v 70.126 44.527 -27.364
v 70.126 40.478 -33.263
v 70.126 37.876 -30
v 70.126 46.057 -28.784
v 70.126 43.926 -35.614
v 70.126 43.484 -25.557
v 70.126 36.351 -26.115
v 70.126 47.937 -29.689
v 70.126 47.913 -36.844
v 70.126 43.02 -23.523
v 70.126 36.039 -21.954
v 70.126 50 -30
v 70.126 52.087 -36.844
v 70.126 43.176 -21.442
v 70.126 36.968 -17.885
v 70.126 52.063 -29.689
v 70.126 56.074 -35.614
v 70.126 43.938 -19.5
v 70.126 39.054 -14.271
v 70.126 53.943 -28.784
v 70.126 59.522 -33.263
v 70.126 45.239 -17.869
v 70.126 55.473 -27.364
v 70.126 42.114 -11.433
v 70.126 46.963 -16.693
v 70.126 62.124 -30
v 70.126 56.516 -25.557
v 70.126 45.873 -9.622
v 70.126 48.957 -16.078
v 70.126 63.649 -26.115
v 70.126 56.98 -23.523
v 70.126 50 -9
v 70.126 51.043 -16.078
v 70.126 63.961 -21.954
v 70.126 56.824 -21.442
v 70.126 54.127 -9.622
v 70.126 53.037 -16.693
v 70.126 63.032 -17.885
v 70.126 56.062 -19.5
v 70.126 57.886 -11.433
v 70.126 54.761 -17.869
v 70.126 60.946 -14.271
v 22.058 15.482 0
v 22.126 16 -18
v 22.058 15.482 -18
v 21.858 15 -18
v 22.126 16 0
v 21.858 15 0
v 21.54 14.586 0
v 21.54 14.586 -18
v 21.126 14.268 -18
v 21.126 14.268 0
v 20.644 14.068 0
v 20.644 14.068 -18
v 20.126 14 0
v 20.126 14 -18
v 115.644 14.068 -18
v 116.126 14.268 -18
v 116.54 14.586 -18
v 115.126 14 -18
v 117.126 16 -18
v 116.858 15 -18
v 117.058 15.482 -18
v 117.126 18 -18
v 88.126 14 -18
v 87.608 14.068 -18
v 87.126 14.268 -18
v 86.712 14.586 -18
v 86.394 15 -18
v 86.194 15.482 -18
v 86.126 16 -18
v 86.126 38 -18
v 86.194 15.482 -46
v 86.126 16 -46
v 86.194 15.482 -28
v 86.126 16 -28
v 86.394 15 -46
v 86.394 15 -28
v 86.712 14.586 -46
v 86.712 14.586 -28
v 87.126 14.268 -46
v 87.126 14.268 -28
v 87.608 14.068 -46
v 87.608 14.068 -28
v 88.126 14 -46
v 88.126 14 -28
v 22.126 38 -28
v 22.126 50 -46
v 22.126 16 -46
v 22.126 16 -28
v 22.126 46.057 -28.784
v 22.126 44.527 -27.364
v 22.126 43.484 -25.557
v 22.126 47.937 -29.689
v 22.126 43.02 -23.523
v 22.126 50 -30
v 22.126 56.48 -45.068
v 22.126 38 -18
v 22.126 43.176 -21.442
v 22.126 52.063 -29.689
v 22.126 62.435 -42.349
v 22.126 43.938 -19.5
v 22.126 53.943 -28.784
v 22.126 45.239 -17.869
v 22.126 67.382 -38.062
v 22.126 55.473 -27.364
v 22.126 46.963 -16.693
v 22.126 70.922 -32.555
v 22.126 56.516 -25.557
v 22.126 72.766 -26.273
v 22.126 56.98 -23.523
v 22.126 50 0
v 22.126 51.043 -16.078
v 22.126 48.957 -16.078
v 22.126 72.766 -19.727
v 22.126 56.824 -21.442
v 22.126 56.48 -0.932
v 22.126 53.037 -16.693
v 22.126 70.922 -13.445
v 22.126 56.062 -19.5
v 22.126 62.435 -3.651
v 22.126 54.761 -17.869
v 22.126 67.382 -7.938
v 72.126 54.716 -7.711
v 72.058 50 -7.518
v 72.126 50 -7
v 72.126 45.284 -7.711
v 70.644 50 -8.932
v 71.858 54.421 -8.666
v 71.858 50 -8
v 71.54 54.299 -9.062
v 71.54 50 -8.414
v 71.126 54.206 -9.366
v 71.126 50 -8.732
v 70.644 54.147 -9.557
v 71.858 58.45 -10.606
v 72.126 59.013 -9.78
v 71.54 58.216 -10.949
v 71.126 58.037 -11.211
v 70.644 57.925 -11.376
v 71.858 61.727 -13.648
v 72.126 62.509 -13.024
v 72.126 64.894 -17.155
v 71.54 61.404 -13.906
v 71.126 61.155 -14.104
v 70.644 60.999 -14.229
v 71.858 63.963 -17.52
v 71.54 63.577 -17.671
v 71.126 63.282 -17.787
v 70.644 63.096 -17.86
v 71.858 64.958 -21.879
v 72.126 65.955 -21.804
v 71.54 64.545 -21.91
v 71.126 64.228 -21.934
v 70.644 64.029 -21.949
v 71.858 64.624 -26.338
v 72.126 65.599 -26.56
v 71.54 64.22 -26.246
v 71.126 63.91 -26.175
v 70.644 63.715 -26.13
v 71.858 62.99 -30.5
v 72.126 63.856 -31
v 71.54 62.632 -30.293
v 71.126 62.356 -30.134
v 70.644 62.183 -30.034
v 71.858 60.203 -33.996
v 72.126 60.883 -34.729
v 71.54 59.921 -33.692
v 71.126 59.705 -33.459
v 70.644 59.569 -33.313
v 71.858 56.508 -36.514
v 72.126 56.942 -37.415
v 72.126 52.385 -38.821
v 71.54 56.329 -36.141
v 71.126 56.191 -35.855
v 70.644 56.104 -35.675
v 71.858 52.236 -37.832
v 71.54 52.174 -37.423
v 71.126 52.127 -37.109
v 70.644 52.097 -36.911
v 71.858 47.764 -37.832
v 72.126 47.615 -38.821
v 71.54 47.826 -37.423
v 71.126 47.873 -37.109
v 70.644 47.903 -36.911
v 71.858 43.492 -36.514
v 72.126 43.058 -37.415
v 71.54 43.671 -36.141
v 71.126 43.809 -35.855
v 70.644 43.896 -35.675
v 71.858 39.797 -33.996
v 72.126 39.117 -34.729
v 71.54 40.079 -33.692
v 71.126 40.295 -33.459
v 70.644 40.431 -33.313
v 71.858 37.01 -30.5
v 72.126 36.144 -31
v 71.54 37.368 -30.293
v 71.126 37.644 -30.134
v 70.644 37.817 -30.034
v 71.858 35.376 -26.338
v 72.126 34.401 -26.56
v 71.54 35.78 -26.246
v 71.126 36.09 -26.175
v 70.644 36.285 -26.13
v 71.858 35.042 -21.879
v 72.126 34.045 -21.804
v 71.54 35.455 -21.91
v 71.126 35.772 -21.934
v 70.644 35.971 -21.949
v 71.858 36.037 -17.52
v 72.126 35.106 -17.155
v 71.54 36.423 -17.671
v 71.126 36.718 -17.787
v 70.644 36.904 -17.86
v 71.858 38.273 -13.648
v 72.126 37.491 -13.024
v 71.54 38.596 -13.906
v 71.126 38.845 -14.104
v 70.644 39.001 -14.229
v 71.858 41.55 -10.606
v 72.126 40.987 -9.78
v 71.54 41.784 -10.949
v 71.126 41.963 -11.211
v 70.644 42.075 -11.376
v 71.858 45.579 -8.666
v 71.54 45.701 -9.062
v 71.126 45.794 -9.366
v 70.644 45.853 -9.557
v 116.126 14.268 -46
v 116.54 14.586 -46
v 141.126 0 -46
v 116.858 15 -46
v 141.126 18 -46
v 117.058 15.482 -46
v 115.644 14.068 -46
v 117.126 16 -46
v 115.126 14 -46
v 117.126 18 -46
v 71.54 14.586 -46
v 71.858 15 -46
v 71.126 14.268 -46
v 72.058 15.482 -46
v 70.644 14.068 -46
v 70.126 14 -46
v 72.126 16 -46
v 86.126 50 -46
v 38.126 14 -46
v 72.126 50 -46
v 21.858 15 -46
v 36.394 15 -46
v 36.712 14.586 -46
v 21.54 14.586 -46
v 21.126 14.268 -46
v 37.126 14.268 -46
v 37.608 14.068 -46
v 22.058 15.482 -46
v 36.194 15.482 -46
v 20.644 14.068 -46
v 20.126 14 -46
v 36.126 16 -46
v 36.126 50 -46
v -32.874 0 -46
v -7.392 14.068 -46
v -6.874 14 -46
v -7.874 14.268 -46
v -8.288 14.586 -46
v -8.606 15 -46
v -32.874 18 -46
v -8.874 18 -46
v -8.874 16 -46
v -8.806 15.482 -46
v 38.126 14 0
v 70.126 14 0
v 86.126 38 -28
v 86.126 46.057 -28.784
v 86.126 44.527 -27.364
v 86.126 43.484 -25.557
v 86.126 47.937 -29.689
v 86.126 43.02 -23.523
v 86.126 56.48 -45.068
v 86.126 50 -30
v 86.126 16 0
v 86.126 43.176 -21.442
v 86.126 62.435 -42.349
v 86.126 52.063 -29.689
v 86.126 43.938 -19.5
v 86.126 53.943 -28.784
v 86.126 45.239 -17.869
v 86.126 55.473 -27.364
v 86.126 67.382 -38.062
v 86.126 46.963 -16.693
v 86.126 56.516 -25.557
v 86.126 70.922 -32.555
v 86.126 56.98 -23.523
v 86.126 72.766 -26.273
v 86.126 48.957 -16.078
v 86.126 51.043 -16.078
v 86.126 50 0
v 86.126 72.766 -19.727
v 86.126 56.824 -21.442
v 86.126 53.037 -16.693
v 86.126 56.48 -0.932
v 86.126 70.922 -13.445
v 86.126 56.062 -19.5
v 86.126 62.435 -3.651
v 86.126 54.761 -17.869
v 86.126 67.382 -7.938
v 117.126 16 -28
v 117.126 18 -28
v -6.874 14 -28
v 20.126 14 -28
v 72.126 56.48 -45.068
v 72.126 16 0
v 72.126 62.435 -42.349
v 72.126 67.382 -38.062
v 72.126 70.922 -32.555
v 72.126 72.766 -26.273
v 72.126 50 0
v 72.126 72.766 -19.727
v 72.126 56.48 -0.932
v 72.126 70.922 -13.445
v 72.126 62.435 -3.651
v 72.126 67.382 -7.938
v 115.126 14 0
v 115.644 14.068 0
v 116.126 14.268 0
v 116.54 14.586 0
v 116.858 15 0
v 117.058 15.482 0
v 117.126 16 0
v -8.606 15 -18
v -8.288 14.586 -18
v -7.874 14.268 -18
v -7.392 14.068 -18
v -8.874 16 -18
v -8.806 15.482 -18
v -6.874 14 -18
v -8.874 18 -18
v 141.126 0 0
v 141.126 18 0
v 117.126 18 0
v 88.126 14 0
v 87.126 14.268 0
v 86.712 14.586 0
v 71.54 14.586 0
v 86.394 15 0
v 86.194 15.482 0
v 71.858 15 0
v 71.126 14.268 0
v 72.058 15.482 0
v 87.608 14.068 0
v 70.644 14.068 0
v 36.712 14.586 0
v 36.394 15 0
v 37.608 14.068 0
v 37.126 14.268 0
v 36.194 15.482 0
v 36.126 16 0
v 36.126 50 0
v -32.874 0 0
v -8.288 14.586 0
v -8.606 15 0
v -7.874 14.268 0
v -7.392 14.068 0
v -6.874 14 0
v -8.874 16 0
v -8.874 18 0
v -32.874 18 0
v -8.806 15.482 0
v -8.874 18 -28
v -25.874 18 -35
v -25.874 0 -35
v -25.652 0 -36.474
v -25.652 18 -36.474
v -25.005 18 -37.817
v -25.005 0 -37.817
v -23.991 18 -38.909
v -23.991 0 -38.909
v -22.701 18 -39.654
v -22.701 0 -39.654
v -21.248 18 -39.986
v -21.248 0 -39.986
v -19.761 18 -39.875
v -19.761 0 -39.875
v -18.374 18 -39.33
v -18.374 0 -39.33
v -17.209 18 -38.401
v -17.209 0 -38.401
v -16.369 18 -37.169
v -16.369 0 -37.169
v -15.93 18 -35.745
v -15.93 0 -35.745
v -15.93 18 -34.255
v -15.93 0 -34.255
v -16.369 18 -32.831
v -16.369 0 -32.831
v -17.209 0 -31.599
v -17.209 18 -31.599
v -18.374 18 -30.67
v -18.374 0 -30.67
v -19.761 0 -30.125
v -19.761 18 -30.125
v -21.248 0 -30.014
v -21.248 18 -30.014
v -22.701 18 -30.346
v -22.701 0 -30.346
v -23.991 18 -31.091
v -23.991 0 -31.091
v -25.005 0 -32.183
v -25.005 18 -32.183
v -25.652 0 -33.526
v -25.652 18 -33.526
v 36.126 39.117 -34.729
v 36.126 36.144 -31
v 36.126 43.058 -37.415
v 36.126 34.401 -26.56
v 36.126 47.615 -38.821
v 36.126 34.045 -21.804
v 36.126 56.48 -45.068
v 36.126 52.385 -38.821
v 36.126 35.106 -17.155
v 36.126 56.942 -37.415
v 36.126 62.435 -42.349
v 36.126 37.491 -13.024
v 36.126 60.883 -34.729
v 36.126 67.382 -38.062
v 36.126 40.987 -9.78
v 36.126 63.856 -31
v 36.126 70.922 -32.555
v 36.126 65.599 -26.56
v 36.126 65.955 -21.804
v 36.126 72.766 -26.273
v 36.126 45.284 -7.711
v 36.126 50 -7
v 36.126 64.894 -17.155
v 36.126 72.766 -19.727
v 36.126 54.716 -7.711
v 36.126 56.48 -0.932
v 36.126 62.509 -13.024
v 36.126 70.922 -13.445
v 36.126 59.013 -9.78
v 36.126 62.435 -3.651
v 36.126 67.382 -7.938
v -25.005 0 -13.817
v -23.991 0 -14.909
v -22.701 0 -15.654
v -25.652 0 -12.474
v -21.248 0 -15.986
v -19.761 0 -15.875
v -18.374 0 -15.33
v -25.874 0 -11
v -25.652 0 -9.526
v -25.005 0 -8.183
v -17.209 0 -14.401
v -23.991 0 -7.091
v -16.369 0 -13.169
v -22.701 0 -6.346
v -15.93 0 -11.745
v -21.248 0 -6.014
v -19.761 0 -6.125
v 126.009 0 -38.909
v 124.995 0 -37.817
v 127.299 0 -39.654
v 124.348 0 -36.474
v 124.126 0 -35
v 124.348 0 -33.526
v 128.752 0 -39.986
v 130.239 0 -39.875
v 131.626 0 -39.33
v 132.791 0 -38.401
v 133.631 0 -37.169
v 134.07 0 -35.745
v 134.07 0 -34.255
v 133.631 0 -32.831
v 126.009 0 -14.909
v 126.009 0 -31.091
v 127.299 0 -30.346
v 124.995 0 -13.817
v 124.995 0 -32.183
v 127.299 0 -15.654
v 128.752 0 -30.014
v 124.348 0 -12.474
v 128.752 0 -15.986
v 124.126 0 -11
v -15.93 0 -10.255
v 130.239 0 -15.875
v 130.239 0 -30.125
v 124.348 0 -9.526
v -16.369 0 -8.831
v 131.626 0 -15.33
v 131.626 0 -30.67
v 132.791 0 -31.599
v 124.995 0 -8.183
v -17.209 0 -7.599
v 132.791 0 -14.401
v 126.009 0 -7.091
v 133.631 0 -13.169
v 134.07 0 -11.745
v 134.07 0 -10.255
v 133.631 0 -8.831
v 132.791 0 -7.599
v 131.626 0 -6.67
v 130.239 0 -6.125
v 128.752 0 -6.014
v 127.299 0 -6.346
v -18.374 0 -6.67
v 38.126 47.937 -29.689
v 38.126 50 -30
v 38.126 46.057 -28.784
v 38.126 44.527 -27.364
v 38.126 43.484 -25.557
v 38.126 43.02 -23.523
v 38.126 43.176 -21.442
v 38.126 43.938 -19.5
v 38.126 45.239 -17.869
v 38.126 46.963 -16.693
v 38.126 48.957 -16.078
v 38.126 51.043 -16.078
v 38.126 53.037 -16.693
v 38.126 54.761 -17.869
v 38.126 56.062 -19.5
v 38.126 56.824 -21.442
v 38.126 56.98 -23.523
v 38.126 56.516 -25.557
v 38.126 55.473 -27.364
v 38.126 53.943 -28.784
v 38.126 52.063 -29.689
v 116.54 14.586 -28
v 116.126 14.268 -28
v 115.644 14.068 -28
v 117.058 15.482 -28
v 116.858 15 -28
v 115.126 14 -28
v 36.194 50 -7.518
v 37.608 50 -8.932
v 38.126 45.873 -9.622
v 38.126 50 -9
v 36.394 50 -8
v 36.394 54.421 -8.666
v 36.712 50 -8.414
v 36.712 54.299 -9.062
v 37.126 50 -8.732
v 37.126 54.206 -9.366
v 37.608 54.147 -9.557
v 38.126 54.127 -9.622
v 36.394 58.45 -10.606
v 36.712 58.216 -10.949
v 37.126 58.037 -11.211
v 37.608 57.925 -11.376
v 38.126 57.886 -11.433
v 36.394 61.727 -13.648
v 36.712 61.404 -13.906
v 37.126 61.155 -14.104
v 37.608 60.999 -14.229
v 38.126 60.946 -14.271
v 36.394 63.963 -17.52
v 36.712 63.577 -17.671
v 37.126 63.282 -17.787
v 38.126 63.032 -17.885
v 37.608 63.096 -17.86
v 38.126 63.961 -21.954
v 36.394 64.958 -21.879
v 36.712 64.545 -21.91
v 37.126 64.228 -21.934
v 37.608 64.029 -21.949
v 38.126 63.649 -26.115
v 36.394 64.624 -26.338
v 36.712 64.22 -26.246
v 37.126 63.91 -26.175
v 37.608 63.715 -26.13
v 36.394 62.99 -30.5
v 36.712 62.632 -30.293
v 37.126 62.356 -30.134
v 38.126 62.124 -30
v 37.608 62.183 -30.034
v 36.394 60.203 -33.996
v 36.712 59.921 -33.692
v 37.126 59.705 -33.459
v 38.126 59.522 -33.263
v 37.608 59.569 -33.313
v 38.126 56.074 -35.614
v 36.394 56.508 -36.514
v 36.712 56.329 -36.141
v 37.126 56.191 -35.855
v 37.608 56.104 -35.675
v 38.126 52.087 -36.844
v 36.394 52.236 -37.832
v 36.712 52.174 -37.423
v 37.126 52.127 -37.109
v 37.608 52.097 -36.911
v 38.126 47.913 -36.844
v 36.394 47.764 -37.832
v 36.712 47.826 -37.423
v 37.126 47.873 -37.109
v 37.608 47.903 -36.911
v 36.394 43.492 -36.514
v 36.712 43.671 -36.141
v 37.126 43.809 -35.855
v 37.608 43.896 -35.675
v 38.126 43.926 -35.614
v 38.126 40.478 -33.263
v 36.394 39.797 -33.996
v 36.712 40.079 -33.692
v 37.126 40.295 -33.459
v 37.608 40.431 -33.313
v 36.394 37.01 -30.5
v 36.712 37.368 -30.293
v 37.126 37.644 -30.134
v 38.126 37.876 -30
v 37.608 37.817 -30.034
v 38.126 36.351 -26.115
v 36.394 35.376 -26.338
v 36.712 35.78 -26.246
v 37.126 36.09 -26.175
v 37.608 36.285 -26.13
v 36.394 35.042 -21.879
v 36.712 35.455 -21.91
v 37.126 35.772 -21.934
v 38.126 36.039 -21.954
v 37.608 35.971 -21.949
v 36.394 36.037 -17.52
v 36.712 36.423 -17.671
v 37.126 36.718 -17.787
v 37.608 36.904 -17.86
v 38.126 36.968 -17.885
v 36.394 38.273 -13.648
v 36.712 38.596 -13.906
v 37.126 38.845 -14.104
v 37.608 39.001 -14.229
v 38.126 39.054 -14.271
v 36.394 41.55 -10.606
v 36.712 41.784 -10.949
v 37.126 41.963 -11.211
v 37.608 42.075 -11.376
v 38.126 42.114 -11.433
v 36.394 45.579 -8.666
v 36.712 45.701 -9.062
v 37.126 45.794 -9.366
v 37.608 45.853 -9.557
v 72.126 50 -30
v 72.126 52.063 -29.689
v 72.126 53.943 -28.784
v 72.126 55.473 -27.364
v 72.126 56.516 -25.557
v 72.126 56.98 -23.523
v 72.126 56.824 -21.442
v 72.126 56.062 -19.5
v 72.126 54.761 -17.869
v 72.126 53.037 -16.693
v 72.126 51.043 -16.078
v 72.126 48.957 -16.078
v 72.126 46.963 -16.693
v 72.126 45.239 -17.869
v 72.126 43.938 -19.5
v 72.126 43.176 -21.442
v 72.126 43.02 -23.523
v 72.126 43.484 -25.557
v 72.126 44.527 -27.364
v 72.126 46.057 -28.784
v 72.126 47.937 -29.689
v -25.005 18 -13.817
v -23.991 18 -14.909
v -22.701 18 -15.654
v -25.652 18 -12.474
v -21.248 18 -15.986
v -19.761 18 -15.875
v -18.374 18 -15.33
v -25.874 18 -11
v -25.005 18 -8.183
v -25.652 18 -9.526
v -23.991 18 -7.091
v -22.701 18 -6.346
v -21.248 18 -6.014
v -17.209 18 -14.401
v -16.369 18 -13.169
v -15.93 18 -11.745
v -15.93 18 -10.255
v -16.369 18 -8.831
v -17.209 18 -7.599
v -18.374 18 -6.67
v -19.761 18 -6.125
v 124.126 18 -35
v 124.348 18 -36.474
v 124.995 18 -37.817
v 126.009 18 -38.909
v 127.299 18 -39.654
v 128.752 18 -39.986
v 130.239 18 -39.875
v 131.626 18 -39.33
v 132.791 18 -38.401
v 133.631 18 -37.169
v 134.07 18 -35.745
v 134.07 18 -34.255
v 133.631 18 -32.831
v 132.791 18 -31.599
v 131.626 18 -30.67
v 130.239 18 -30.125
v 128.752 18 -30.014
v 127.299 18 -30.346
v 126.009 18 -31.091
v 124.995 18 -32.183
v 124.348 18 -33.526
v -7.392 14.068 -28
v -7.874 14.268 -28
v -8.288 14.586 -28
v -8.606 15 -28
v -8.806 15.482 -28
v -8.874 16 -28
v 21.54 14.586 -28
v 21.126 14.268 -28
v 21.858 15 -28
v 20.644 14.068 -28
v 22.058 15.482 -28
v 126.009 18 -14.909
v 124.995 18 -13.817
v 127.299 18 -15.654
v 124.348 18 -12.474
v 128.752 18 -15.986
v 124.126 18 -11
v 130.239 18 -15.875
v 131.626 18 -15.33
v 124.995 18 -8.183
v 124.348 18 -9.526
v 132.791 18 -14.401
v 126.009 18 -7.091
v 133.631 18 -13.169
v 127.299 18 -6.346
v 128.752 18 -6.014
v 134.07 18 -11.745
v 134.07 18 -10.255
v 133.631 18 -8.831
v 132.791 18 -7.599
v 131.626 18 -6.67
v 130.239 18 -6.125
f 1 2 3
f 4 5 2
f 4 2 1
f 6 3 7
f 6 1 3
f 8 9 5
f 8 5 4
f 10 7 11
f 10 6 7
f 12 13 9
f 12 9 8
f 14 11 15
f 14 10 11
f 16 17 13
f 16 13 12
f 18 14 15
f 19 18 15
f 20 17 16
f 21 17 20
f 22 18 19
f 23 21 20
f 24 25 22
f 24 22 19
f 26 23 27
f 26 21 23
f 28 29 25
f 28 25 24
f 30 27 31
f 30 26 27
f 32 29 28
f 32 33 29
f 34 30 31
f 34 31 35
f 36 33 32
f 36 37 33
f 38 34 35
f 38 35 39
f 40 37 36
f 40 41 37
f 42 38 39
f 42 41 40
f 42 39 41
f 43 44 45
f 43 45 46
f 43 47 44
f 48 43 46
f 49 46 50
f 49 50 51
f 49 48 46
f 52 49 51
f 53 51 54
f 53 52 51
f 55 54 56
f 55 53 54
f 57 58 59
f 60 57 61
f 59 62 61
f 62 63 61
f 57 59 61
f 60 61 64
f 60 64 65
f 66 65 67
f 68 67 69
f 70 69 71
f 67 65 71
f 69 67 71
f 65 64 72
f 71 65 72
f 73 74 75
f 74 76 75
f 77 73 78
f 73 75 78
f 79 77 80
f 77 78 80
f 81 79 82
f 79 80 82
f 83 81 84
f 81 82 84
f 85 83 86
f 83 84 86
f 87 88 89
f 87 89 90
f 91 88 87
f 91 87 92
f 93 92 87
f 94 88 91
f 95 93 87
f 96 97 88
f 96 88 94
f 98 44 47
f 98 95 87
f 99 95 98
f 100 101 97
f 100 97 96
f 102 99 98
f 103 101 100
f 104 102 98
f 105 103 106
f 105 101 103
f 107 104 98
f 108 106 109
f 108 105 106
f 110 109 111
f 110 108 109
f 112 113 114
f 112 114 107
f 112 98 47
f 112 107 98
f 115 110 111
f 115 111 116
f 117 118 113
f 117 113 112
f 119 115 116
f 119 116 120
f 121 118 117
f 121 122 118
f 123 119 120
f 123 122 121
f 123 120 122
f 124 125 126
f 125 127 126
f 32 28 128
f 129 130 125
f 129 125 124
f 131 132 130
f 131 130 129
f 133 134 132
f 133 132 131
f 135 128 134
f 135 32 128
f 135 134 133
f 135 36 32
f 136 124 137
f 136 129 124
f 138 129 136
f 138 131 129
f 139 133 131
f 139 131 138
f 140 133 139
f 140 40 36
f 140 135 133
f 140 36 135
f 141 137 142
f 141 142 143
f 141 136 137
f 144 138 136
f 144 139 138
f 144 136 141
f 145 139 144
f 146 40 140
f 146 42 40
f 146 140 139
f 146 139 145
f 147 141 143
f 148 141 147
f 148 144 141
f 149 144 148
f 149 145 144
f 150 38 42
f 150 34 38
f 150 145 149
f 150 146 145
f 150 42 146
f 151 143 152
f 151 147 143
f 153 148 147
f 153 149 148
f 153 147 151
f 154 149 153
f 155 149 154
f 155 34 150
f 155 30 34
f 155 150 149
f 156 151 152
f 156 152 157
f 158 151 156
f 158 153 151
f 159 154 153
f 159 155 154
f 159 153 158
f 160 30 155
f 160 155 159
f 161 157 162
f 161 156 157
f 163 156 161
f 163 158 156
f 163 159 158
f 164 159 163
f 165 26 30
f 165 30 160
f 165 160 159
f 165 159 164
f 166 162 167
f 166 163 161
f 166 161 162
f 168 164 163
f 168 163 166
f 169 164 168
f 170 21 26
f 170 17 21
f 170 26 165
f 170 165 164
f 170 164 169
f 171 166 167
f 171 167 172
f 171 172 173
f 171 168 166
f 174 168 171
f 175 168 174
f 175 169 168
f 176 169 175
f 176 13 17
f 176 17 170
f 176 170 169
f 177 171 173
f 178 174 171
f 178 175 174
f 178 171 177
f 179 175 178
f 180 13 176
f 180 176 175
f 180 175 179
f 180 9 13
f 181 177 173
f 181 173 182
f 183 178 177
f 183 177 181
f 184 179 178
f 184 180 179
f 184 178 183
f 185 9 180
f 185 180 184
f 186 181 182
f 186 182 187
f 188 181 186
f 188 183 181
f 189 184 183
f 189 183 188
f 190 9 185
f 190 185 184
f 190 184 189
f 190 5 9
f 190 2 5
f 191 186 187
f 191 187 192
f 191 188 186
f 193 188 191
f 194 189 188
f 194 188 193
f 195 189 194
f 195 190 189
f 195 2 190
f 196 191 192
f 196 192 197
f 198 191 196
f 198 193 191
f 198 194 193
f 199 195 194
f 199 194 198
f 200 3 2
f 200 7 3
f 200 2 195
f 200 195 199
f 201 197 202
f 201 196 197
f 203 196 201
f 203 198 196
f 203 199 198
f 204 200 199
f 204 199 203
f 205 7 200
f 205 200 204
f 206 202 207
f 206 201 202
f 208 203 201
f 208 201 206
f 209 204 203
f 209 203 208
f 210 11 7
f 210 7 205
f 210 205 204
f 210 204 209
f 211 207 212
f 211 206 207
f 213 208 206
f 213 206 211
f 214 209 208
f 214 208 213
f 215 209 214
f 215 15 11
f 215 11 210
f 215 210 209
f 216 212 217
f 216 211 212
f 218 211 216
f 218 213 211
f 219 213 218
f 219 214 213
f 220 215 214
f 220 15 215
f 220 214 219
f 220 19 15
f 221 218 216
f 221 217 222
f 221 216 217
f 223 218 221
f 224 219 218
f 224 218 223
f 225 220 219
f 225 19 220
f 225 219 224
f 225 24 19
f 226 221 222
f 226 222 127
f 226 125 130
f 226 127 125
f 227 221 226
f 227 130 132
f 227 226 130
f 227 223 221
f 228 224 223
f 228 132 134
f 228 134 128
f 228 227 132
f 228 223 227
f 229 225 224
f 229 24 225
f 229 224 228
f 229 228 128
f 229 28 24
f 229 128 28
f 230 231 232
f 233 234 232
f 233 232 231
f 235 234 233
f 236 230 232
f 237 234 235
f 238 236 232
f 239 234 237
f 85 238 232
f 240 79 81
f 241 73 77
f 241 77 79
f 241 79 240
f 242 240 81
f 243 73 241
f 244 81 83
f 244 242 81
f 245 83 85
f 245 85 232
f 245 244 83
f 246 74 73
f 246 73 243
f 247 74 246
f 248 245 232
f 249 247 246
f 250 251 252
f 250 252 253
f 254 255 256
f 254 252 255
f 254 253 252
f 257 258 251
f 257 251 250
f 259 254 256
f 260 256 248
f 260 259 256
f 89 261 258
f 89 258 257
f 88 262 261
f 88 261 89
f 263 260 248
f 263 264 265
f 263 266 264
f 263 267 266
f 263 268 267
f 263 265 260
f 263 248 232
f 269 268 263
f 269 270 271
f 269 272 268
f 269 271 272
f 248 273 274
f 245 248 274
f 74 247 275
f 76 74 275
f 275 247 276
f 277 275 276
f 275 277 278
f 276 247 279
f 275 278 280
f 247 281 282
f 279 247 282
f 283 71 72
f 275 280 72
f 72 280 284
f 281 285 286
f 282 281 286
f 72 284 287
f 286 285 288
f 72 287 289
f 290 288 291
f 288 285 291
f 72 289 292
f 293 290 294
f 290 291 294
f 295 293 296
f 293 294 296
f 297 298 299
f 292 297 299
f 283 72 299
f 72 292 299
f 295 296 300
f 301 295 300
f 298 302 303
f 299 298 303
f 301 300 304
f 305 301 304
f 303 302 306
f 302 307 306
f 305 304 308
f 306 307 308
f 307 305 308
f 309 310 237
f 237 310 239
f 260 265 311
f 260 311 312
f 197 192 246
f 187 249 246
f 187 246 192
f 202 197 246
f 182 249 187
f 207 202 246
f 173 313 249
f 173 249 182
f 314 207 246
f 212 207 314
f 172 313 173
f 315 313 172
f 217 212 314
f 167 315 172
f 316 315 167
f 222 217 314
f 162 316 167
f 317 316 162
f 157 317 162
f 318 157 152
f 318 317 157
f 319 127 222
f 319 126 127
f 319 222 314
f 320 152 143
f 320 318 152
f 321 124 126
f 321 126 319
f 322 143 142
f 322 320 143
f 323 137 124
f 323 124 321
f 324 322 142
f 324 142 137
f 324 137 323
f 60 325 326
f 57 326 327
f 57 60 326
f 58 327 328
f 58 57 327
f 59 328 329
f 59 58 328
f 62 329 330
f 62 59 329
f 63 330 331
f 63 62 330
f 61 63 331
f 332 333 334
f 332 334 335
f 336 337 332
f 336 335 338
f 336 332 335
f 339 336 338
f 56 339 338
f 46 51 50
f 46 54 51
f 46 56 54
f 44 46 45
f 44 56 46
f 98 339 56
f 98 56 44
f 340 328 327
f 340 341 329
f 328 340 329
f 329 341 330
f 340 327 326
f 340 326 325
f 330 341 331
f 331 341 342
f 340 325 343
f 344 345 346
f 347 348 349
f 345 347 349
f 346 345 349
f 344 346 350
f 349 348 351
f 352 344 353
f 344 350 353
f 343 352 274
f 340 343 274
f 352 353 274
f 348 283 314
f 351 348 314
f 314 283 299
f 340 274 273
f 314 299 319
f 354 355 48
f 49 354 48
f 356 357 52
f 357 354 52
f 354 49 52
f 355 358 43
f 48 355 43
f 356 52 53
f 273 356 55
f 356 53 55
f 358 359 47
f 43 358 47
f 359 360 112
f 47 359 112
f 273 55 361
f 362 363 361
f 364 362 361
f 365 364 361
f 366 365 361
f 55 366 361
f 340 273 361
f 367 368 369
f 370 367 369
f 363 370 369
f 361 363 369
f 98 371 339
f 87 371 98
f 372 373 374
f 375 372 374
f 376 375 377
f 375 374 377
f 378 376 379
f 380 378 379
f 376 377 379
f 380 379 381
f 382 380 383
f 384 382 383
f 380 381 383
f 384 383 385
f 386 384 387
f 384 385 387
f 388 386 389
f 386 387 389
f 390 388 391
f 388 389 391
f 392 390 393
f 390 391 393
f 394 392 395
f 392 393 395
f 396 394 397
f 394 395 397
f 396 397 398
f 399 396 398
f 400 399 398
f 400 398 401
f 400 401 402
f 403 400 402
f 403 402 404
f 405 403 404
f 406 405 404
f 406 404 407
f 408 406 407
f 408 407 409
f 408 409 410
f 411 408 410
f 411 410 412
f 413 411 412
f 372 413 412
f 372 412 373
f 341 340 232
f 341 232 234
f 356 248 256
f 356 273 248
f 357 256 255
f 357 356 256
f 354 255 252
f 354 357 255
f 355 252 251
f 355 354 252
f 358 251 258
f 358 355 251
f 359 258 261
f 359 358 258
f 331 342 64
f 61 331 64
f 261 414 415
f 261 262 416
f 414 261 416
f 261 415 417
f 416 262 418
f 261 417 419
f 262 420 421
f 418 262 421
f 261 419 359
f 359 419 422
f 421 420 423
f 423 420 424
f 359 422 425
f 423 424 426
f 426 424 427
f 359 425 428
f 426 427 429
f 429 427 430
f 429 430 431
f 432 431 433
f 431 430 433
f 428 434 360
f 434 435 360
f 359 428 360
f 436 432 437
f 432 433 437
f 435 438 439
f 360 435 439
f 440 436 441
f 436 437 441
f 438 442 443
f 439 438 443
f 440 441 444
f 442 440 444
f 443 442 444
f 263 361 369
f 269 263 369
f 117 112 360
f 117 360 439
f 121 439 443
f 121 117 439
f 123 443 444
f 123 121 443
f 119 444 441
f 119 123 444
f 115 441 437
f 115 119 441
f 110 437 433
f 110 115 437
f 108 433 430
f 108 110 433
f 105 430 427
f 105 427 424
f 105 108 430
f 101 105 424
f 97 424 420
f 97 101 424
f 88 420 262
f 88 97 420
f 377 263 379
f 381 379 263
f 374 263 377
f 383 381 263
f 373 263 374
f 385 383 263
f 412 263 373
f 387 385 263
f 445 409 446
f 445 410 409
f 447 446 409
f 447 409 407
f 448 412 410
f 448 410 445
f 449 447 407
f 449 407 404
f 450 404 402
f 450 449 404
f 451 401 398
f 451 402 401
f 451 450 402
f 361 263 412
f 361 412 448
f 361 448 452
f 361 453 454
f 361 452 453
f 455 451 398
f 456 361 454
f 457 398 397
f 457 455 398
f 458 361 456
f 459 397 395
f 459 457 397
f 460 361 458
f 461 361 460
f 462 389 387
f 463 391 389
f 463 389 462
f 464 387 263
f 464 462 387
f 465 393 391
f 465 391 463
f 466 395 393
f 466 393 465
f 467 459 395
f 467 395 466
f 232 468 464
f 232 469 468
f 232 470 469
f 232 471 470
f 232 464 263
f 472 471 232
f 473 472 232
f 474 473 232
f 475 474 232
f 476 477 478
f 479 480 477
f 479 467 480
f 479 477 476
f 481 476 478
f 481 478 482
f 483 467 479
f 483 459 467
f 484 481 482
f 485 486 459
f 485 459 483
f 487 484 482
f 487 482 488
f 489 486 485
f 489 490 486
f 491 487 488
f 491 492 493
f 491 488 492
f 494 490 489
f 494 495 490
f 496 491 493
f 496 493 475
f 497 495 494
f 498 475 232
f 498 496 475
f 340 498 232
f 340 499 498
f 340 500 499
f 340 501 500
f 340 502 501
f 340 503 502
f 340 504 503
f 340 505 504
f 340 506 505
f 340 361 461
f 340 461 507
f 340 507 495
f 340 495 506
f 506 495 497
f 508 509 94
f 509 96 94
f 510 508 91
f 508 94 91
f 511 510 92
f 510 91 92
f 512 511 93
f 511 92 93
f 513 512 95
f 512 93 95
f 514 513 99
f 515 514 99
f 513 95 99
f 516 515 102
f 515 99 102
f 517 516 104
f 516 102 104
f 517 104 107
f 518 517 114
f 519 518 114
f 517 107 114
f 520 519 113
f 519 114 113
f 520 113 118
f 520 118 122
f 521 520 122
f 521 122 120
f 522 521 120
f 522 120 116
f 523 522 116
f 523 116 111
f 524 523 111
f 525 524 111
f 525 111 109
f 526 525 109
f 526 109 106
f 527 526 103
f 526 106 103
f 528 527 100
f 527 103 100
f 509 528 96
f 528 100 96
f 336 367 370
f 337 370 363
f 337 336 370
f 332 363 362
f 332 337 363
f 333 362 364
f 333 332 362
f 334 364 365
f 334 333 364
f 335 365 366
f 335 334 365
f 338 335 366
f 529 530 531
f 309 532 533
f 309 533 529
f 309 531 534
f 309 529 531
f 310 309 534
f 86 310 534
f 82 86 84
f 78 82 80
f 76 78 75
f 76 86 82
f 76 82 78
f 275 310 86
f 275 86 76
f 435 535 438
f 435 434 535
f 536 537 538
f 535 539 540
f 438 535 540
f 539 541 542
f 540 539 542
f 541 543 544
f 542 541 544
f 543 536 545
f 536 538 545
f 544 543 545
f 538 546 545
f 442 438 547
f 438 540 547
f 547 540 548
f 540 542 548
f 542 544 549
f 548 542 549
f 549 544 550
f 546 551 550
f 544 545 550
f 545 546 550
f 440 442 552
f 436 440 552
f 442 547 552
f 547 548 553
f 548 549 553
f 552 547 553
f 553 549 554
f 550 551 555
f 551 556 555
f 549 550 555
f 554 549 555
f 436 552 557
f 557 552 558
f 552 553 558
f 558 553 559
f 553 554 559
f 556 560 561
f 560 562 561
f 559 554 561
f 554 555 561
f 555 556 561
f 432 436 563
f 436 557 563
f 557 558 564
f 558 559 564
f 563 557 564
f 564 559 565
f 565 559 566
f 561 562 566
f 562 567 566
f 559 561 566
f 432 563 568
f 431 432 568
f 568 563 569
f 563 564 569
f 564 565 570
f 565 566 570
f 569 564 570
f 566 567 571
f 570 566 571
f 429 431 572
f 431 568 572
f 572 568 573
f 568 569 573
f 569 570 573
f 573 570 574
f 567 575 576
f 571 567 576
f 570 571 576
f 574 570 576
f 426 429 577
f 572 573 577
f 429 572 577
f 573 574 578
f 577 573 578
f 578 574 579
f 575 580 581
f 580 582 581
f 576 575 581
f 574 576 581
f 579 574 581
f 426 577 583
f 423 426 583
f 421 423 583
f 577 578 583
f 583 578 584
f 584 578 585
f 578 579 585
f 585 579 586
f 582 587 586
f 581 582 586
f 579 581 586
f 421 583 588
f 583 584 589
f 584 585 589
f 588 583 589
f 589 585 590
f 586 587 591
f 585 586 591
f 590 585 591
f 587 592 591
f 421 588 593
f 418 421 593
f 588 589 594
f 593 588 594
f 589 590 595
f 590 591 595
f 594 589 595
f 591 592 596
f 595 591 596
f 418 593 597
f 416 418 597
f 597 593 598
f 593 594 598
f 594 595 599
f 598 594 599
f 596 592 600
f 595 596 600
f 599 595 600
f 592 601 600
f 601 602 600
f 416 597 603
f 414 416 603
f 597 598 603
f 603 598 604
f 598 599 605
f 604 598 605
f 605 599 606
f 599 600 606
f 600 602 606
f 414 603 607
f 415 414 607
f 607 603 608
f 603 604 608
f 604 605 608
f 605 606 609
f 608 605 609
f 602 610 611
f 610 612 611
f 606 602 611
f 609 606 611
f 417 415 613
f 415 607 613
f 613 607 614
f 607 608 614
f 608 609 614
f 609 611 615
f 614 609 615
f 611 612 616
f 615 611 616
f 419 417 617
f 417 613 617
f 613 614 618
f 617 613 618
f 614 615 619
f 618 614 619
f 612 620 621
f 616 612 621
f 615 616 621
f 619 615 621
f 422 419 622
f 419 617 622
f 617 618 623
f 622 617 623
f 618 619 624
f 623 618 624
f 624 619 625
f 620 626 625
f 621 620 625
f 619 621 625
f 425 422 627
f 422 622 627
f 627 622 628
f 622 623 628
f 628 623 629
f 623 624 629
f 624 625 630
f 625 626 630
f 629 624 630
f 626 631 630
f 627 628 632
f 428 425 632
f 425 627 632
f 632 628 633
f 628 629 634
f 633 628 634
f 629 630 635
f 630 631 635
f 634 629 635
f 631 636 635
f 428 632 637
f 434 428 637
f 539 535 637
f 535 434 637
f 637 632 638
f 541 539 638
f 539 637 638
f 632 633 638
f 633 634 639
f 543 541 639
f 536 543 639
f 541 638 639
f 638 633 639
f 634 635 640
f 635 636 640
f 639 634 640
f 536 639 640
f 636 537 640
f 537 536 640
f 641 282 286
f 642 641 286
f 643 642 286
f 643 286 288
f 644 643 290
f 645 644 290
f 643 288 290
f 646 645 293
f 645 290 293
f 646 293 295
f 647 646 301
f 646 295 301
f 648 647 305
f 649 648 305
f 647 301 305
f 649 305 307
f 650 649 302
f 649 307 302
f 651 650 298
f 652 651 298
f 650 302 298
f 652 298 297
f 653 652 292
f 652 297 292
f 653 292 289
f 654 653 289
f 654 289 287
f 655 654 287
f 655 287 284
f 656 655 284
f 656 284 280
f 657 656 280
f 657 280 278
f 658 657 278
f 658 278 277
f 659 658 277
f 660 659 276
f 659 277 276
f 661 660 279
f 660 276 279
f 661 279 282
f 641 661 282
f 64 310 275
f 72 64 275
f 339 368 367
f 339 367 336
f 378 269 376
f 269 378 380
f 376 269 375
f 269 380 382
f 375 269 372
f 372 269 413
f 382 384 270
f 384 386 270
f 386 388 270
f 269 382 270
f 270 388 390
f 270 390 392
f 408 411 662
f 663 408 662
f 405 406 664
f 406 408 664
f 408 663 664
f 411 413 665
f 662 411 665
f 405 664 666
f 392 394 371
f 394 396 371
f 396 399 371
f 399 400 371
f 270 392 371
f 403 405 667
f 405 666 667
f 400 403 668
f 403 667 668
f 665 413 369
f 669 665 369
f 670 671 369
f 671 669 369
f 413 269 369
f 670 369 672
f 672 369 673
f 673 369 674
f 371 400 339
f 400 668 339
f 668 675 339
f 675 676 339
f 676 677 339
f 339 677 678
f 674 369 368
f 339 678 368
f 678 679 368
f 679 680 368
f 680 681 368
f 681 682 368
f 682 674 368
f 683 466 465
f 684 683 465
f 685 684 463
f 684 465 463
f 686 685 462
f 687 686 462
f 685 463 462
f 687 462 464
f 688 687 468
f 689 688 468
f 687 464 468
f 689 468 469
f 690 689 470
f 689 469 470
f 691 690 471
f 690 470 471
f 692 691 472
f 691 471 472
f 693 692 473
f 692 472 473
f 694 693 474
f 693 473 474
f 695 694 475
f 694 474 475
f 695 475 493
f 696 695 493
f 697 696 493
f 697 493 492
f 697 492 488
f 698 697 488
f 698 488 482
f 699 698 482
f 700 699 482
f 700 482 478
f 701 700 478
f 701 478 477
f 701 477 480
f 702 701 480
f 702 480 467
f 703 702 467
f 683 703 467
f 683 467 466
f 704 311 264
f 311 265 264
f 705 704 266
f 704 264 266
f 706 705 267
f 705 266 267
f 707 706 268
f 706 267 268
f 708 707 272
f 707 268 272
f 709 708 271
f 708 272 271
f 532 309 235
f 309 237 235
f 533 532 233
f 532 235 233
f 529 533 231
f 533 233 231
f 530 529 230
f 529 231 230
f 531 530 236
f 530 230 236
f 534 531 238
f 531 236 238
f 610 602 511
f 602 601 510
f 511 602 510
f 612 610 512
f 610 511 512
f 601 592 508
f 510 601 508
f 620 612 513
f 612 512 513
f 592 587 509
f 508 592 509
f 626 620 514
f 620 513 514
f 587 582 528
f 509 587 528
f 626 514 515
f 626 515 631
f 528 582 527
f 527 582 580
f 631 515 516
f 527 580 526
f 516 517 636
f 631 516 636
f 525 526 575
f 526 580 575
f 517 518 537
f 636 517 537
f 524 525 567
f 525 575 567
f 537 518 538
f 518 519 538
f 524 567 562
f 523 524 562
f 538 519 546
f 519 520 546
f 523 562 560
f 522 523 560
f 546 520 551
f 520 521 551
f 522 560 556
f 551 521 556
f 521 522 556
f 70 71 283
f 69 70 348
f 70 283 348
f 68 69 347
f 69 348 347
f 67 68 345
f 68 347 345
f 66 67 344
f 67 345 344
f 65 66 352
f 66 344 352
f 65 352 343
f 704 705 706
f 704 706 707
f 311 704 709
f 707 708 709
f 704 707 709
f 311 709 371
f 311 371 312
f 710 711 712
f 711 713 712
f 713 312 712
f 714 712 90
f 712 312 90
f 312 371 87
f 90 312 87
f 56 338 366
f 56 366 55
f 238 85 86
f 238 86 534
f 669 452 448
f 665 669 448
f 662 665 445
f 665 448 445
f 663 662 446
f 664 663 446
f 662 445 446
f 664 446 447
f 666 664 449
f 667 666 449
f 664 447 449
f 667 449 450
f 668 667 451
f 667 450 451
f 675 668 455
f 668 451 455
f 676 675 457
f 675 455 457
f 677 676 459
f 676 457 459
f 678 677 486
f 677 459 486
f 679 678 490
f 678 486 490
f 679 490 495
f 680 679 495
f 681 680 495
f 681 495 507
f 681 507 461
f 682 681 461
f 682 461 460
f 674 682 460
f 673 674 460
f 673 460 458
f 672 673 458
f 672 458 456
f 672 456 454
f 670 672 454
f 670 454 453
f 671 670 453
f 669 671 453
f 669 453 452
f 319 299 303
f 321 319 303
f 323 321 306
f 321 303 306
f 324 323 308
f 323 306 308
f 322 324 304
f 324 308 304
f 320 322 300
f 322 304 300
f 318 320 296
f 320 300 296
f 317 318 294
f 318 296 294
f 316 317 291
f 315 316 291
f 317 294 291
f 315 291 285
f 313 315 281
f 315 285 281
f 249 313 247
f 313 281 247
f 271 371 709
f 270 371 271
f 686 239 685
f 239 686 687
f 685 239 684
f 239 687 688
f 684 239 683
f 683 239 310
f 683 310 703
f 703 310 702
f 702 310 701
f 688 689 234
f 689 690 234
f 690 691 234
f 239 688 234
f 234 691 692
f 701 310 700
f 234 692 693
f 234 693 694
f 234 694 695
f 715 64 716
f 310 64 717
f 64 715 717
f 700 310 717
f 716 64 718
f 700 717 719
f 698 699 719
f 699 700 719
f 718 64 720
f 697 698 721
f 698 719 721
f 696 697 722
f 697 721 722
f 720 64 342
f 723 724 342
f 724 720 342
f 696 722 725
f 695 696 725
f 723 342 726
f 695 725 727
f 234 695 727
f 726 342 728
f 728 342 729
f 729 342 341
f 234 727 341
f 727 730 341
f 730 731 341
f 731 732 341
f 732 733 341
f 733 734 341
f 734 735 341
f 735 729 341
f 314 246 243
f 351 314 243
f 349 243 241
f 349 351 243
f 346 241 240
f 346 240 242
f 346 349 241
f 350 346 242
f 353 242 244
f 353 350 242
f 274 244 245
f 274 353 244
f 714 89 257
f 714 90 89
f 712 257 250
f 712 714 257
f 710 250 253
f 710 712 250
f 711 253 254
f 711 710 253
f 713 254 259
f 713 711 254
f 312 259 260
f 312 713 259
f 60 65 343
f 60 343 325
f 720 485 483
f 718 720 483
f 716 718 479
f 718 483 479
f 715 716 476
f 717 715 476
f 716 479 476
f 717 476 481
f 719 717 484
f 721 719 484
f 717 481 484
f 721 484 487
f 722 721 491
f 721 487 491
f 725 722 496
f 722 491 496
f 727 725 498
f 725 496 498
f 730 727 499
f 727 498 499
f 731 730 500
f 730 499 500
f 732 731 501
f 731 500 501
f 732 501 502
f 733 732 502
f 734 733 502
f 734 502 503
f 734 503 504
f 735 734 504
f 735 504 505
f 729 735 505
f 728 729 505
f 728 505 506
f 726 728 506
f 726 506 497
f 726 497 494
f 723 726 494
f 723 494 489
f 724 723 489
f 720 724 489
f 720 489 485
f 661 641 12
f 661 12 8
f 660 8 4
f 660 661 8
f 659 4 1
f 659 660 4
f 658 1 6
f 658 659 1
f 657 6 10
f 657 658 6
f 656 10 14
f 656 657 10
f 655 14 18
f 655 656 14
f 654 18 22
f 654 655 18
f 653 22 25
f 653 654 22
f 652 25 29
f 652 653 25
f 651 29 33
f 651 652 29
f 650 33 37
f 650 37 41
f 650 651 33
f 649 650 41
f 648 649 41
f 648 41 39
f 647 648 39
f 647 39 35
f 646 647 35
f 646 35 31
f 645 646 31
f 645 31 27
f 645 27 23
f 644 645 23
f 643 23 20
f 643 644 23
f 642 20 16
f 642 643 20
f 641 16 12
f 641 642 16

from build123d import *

# Parameters (mm, degrees)
SKETCH1_W                  = 174
SKETCH1_H                  = 18
BOSS_EXTRUDE1_DEPTH        = 46
SKETCH3_W                  = 126
SKETCH3_H                  = 46
CUT_EXTRUDE1_DEPTH         = 4
SKETCH4_R                  = 7
BOSS_EXTRUDE2_DEPTH        = 14
SKETCH5_R                  = 14
SKETCH5_R_2                = 7
BOSS_EXTRUDE3_DEPTH        = 2
RIB1_REACH                 = 162.545
SKETCH6_WALL_W             = 359.980893116
SKETCH6_WALL_H             = 10
FILLET1_R                  = 2
FILLET2_R                  = 2
FILLET3_R                  = 2
F_10_0_10_DIAMETER_HOLE5_D = 10


with BuildPart() as part:
    # Sketch1 → Boss-Extrude1 (new body)
    with BuildSketch(Plane.XY):
        with Locations((54.12605042, 9)):
            Rectangle(SKETCH1_W, SKETCH1_H)
    extrude(amount=-BOSS_EXTRUDE1_DEPTH)

    # Sketch3 → Cut-Extrude1 (cut)
    with BuildSketch(Plane(origin=(0, 18, 0), x_dir=(1, 0, 0), z_dir=(0, 1, 0))):
        with Locations((54.12605042, 23)):
            Rectangle(SKETCH3_W, SKETCH3_H)
    extrude(amount=-CUT_EXTRUDE1_DEPTH, mode=Mode.SUBTRACT)

    # Sketch4 → Boss-Extrude2 (add)
    with BuildSketch(Plane(origin=(86.12605042, 0, 0), x_dir=(0, 0, -1), z_dir=(1, 0, 0))):
        with BuildLine():
            Line((46, 14), (0, 14))
            Line((0, 14), (0, 50))
            ThreePointArc((0, 50), (23, 73), (46, 50))
            Line((46, 50), (46, 14))
        make_face()
        with Locations((23, 50)):
            Circle(SKETCH4_R, mode=Mode.SUBTRACT)
    extrude(amount=-BOSS_EXTRUDE2_DEPTH)

    # Sketch5 → Boss-Extrude3 (add)
    with BuildSketch(Plane.ZY.offset(-72.12605042)):
        with Locations((-23, 50)):
            Circle(SKETCH5_R)
        with Locations(Location((-23, 50, 0), (0, 0, 180))):
            Circle(SKETCH5_R_2, mode=Mode.SUBTRACT)
    extrude(amount=BOSS_EXTRUDE3_DEPTH)

    # Sketch6 wall → Rib1 (add, up to next)
    with BuildSketch(Plane(origin=(101.62605042, 28, -23), x_dir=(-0.840296648224, 0.542126869822, 0), z_dir=(-0.542126869822, -0.840296648224, 0)), mode=Mode.PRIVATE) as rib1_sk1:
        Rectangle(SKETCH6_WALL_W, SKETCH6_WALL_H)
    rib1_tool1 = extrude(rib1_sk1.sketch, amount=RIB1_REACH, mode=Mode.PRIVATE) - part.part
    add(rib1_tool1.solids().sort_by_distance((101.62605042, 28, -23))[0])

    # Mirror4: part across plane


with BuildPart() as part_1:
    add(part.part)
    add(part.part.mirror(Plane(origin=(54.12605042, 0, 0), x_dir=(0, 0, 1), z_dir=(1, 0, 0))))

    # Fillet1
    fillet1_edges = [part_1.edges().sort_by_distance(p)[0] for p in [
        (-8.87394958, 14, -9),
        (22.12605042, 14, -37),
        (36.12605042, 14, -23),
        (22.12605042, 14, -9),
        (-8.87394958, 14, -37),
        (117.12605042, 14, -9),
        (72.12605042, 14, -23),
        (86.12605042, 14, -9),
        (86.12605042, 14, -37),
        (117.12605042, 14, -37),
    ]]
    fillet(fillet1_edges, radius=FILLET1_R)

    # Fillet2
    fillet2_edges = [part_1.edges().sort_by_distance(p)[0] for p in [
        (36.12605042, 50, -37),
    ]]
    fillet(fillet2_edges, radius=FILLET2_R - 0.0001)  # a hair under: the kernel refuses the full size

    # Fillet3
    fillet3_edges = [part_1.edges().sort_by_distance(p)[0] for p in [
        (72.12605042, 50, -37),
    ]]
    fillet(fillet3_edges, radius=FILLET3_R - 0.0001)  # a hair under: the kernel refuses the full size

    # Ø10.0 (10) Diameter Hole5 (through all)
    with Locations(Plane(origin=(0, 18, 0), x_dir=(1, 0, 0), z_dir=(0, 1, 0))):
        with Locations((-20.87394958, 35), (-20.87394958, 11), (129.12605042, 35), (129.12605042, 11)):
            Hole(F_10_0_10_DIAMETER_HOLE5_D / 2)


solid = part_1.part
